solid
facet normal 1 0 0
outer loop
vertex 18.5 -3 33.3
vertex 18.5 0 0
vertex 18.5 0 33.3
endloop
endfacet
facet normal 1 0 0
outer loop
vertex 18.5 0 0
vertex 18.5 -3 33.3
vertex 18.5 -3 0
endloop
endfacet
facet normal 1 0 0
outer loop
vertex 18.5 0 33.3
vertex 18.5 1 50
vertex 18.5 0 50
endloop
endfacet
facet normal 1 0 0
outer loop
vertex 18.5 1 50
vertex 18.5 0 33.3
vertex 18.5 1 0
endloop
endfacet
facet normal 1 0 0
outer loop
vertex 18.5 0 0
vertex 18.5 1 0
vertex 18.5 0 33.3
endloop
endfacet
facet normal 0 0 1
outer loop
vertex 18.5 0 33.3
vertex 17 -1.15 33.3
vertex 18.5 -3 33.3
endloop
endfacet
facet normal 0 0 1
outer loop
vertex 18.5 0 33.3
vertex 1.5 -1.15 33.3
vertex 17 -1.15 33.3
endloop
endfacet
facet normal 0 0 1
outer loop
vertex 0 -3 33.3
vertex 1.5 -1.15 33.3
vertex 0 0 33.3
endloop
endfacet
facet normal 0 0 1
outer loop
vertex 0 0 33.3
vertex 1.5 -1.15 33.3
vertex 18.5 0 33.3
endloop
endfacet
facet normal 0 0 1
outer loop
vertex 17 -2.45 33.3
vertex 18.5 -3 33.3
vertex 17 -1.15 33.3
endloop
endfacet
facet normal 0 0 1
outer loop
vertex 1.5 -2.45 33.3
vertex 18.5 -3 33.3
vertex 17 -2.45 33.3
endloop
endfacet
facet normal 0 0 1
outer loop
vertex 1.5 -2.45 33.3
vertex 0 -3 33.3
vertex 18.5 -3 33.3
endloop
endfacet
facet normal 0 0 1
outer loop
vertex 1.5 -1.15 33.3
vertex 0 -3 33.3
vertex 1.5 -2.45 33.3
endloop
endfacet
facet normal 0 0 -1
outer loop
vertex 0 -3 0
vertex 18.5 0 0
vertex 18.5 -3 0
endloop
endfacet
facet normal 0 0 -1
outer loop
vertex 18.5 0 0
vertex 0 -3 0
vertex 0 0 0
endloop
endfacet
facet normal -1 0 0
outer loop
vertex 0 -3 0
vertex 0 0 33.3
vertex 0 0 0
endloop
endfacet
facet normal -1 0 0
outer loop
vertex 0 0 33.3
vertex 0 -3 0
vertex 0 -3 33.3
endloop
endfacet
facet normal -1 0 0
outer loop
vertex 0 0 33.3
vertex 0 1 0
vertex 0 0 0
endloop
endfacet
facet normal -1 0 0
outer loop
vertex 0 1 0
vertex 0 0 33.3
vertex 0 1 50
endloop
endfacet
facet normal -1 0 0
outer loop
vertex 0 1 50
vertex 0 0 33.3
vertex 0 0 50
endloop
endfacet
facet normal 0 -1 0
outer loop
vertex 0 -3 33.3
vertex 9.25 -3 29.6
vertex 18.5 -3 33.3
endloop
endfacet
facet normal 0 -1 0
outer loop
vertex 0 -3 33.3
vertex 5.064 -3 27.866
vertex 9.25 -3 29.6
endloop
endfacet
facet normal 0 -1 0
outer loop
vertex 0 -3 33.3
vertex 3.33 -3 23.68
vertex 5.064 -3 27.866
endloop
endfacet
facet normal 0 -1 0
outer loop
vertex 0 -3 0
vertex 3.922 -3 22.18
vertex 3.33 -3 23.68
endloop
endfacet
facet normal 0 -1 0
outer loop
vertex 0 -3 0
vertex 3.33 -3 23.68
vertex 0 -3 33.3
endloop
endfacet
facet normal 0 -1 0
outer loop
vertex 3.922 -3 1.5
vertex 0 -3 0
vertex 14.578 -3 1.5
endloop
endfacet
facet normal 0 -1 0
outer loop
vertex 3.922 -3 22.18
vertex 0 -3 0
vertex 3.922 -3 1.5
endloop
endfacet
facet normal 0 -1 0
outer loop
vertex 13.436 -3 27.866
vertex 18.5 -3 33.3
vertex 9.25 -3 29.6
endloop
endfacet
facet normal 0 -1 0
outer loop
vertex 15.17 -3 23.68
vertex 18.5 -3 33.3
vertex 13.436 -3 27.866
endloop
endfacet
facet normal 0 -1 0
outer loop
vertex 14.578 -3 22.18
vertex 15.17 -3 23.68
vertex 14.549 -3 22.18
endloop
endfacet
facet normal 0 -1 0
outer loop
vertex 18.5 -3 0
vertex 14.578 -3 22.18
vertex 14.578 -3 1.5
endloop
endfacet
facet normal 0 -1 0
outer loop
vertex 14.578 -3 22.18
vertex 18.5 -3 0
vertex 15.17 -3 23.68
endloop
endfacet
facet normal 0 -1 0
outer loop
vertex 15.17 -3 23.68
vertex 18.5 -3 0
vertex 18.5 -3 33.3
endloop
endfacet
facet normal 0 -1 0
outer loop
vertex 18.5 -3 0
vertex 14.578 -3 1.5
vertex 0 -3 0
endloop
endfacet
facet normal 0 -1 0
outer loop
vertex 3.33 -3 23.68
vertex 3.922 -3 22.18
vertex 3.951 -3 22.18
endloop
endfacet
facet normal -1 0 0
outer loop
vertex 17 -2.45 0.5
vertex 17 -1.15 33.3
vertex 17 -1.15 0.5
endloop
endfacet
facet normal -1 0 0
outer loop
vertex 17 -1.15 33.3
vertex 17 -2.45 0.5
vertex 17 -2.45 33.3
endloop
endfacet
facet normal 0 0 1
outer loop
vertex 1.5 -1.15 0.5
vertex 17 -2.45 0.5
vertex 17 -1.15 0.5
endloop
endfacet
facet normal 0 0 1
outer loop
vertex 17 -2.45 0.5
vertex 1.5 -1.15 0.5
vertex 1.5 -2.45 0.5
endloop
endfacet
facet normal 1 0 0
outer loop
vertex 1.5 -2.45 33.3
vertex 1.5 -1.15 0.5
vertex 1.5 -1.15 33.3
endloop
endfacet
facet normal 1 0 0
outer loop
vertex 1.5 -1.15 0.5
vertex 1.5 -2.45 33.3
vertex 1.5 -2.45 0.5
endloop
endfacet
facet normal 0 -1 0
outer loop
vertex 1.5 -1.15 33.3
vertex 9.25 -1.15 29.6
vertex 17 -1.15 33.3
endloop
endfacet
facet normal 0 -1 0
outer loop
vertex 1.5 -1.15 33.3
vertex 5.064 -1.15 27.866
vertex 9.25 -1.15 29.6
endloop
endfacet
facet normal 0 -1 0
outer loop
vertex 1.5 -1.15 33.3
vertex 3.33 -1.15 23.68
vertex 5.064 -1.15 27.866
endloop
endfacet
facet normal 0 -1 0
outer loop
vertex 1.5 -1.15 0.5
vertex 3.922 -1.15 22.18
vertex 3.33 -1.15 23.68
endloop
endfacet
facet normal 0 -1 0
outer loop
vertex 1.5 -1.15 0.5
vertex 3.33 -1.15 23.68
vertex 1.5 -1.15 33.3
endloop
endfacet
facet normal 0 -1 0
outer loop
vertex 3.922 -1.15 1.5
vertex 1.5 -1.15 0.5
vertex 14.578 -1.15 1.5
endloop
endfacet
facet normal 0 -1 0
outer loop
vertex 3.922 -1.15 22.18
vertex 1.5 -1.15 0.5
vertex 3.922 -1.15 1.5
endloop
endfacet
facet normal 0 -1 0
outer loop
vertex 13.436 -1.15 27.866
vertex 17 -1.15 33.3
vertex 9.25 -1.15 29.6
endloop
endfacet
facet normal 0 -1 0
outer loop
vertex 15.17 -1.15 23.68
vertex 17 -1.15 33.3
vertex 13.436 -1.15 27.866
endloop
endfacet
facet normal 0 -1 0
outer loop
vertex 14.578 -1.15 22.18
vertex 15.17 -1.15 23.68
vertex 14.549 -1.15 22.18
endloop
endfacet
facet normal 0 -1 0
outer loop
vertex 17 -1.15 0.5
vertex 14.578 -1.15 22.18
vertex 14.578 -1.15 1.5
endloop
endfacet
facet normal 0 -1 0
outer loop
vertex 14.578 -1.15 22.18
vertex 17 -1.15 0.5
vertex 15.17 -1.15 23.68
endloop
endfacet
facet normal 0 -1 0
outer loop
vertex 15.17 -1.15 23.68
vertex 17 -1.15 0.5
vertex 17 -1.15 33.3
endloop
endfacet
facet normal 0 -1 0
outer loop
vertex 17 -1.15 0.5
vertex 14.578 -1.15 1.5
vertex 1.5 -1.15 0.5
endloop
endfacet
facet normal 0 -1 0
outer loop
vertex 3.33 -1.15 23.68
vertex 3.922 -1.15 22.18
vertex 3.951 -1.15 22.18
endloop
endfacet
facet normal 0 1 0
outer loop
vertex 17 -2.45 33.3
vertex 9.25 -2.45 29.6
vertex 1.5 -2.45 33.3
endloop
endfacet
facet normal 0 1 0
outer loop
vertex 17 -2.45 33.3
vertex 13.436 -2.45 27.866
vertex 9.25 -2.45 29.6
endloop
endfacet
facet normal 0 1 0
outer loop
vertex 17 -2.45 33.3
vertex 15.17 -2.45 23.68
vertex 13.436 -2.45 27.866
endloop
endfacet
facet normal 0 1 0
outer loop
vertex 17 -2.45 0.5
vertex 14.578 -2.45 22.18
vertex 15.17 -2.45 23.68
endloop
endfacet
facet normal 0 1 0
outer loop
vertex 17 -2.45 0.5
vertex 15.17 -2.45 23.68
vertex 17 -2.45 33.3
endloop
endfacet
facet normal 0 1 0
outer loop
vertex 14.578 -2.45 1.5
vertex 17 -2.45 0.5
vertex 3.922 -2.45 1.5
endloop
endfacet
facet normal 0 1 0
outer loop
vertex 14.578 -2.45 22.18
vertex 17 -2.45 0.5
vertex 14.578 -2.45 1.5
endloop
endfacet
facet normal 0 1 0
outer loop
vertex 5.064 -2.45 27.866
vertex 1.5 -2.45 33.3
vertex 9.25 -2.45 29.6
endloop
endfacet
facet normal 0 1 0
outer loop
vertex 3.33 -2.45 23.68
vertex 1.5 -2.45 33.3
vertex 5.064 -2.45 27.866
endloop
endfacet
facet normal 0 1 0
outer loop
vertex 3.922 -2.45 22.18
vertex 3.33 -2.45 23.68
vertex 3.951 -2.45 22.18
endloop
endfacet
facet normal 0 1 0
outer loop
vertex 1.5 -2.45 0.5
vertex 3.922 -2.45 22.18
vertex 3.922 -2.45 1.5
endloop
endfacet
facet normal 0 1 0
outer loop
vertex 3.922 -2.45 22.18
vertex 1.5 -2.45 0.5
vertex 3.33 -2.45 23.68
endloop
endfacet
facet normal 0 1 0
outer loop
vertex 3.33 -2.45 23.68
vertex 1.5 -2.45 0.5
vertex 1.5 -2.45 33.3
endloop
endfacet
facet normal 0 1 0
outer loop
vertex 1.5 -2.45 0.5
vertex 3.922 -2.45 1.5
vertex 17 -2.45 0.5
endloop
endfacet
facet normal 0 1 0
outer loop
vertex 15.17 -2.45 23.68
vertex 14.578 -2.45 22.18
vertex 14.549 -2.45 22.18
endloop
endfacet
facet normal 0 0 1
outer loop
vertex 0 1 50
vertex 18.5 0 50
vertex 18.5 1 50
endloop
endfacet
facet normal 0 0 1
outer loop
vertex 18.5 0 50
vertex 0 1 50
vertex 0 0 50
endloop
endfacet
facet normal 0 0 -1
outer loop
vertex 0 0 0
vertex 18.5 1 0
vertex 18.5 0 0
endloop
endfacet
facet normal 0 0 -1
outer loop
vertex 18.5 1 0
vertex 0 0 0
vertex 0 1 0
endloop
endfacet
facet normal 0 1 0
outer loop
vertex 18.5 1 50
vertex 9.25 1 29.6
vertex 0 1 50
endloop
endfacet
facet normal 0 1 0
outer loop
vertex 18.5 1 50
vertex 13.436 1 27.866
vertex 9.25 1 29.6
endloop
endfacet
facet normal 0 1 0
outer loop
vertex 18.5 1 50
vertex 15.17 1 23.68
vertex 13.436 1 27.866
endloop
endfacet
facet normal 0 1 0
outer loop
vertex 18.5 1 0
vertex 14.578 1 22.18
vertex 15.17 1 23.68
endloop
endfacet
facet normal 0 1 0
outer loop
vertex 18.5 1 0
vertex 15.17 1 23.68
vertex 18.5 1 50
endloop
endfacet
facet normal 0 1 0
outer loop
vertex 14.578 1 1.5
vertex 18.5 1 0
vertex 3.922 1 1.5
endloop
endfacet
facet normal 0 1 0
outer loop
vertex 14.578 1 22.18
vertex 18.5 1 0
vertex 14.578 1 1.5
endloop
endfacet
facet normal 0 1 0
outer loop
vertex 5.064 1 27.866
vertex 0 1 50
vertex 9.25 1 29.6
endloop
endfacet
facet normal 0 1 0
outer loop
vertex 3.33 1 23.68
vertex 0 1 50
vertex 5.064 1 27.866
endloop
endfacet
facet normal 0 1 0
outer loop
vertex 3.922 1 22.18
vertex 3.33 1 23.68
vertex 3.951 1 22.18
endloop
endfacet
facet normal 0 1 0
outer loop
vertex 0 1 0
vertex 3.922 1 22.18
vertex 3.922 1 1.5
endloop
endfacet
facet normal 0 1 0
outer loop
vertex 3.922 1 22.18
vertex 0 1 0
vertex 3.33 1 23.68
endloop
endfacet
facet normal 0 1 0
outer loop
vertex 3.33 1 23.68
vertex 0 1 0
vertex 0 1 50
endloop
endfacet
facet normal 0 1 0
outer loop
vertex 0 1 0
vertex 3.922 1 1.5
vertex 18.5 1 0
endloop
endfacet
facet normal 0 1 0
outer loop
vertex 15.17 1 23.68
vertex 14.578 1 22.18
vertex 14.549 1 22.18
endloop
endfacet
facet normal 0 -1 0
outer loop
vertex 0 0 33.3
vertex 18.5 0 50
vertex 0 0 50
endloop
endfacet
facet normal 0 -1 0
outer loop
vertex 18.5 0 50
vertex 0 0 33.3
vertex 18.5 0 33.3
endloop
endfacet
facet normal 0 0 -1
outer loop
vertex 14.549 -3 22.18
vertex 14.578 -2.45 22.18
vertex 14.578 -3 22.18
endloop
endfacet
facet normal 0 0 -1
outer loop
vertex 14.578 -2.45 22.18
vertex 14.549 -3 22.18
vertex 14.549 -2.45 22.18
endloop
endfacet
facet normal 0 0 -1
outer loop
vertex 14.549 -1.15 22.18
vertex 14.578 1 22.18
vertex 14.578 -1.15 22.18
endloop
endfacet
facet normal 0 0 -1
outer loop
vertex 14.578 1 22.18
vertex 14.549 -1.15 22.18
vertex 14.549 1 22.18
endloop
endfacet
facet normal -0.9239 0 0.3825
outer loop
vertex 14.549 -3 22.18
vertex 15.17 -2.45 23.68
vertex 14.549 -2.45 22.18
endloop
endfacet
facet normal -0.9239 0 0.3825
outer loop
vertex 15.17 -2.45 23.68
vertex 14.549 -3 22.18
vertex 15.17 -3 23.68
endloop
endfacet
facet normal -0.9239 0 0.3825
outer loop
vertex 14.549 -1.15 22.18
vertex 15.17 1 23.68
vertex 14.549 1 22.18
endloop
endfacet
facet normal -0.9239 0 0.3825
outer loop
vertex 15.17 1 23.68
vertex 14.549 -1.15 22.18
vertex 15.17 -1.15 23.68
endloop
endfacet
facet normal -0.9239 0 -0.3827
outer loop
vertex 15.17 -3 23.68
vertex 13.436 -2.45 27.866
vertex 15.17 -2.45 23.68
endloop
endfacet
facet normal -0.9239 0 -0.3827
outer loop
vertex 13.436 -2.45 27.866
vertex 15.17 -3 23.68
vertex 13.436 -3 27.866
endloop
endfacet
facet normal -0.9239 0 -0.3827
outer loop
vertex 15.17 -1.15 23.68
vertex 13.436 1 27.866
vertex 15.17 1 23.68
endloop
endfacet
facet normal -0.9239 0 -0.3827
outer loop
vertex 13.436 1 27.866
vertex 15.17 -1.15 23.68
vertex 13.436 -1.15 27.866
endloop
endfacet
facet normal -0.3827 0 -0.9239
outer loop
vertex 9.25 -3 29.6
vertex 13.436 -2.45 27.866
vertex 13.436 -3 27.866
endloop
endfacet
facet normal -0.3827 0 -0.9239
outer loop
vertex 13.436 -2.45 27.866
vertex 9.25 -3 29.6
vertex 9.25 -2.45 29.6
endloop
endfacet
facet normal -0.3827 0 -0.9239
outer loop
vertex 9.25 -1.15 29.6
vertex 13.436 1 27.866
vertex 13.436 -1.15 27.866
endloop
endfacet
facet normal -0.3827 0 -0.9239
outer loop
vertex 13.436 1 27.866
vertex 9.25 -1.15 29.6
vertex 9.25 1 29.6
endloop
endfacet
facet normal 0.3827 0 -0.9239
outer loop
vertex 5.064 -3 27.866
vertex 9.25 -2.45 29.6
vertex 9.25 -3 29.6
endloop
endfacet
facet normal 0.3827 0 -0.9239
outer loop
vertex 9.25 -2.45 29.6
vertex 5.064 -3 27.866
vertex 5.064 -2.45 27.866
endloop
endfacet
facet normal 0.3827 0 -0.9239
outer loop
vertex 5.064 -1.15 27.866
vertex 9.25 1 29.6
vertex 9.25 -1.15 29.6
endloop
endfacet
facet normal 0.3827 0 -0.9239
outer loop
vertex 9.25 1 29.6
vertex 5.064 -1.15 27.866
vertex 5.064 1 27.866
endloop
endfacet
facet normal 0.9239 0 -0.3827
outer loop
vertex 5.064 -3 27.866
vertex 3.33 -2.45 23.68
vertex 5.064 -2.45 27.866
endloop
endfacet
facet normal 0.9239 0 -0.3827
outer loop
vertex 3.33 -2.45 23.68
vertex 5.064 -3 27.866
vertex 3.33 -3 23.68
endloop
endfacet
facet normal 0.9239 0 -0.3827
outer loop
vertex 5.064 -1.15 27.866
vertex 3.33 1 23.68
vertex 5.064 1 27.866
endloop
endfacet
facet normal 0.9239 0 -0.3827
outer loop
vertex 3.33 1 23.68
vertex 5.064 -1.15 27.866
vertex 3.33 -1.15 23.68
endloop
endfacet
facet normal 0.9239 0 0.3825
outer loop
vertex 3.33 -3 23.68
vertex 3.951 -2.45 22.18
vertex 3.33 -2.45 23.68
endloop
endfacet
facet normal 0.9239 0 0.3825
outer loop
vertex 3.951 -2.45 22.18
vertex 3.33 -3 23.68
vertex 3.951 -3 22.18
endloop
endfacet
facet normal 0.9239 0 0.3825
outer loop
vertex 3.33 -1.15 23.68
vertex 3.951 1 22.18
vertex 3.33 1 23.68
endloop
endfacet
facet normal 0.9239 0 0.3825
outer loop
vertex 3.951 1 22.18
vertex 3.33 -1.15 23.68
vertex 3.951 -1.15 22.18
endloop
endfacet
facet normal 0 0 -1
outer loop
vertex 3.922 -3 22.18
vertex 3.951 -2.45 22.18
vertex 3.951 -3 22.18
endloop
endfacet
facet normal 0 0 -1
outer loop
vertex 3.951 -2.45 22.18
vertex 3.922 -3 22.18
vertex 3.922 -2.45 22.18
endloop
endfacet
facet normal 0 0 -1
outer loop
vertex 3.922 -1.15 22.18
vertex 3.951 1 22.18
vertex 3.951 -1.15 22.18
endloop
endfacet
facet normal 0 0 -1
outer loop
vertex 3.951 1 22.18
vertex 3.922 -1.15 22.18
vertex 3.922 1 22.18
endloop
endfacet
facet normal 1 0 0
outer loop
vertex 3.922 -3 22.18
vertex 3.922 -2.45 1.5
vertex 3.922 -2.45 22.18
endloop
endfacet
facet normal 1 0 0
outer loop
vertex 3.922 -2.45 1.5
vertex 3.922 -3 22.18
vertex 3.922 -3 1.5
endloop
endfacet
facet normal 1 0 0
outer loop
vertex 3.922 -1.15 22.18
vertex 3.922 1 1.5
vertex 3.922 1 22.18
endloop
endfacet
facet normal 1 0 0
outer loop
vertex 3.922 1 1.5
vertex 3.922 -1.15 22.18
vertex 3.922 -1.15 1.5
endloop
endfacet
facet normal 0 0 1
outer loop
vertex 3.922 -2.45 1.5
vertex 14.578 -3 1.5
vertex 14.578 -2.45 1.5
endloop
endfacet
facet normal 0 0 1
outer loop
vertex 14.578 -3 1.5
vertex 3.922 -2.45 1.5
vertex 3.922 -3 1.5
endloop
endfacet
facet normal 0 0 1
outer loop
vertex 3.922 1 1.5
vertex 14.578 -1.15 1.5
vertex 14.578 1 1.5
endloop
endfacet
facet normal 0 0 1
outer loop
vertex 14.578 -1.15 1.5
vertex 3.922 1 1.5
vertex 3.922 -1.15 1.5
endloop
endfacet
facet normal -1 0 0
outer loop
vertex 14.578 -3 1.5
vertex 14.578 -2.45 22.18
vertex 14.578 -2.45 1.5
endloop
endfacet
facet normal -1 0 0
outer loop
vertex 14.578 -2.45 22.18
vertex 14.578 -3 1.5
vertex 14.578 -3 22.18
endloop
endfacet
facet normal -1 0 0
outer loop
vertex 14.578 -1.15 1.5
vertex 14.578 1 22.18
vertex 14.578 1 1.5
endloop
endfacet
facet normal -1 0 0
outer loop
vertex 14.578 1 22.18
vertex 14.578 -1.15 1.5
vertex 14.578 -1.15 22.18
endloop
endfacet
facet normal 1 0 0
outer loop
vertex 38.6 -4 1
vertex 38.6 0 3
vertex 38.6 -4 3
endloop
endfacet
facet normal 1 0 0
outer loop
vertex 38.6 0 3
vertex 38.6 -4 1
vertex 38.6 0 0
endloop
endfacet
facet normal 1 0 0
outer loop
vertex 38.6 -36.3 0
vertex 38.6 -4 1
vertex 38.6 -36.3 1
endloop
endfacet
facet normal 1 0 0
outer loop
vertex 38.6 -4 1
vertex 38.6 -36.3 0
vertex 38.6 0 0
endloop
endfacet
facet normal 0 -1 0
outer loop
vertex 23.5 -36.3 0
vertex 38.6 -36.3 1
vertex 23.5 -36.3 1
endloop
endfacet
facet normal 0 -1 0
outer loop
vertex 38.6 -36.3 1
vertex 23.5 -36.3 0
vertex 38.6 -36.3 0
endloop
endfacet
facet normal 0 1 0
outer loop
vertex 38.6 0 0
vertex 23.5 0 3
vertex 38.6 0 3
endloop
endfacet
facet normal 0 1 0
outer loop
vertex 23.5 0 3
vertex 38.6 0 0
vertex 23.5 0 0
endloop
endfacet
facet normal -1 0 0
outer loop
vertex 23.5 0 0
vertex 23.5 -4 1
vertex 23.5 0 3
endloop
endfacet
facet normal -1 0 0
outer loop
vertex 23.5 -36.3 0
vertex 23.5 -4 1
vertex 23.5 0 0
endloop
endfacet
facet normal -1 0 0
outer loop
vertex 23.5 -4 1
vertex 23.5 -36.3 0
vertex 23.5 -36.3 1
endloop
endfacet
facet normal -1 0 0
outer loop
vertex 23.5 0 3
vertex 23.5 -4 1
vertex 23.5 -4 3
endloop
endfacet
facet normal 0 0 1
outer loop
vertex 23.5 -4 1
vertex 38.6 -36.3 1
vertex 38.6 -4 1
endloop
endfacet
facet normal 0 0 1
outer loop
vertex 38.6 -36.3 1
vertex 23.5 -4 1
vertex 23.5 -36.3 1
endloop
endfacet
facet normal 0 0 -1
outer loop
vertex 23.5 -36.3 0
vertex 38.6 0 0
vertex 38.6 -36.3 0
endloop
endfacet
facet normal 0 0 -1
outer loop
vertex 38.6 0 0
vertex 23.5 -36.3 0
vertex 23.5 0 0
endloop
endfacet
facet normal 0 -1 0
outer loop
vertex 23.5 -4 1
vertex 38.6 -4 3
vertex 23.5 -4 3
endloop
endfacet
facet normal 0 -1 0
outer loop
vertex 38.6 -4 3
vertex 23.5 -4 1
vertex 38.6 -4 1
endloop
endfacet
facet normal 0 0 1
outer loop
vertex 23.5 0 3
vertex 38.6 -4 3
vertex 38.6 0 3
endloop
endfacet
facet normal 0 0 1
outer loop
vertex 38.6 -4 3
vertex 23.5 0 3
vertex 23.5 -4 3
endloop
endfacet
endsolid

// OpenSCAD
// file: neuturm.scad
use <MCAD/regular_shapes.scad>

// Setup
// höhe, seite, array durchgänge, array tore
hoehe = 50;
radius = 18.5;
seite = 18.5;
tore = [4];
durchgaenge = [];

// Berechnete größen

sideRad = seite * sqrt(3)/2;


module move(x=0,y=0,z=0,rx=0,ry=0,rz=0)
{ translate([x,y,z])rotate([rx,ry,rz]) children(); }

module wallmove(x=0, y=0, z=0, seite=0) {
  rotate([0,0,seite*60]) translate([x,y,z]) children();
}

function flatten(l) = [ for (a = l) for (b = a) b ] ;


/* move(30,sideRad+10,1, 0, 0, 0) zinnenkranz();
turm(); */

module turm() {
  difference() {
    // turmkörper
    union() {
      hexagon_tube(hoehe, radius, 1);
      hexagon_prism(2,radius);
      for (i = tore) {
        wallmove(0, sideRad-.1, 0, i)
        tor();
      }
        mauerstruktur();
    }
    for (i = flatten([durchgaenge, tore])) {
      wallmove(0, sideRad-2, 1, i)
       toroeffnung();
    }
    for (i = [1:6]) {
      wallmove(0, sideRad-2, 10, i)
       fenster();
    }
    move(0,0,1) cylinder_tube(5, sideRad-2, radius);
  }
}

module zinnenkranz() {
move(0, 0, -1)
  difference() {
    union() {
    difference() {
      translate([0,0,0]) hexagon_tube(7,radius +3.5,2);
        zinnen();
    }
    move(0,0,3) hexagon_prism(1, radius +1.5);
    move(0,0,0) hexagon_prism(3, radius -1.2);
    }
    for(i = durchgaenge) {
    rotate([0,0,i*60]) translate([0, sideRad+2.2, 4]) cube([radius*2,4,radius +1.5], center = true);
    }
  }
}

module tor() {
  torbreit = seite;
  torhoch = torbreit*1.8;
  color("Green") {
    move(0,0, torhoch/2) cube([torbreit, 1.2, torhoch], center = true);
    move(0,1, torhoch/2) difference() {
      cube([torbreit, 1.5, torhoch], center=true);
      move(0,0,2) cube([torbreit-3, 1, torhoch + 3], center=true);
    }
  }
}

module toroeffnung() {
  $fn = 8;
  torbreit = seite - seite/5;
  torhoch = hoehe/3 - (hoehe/30);
  rundungdm = torbreit/2 -torbreit/10;
  //
  translate([0,5,rundungdm*4]) {
    union() {
      rotate([90,0,0]) {
        linear_extrude(6) {
          circle(rundungdm);
          move(0, -rundungdm*2) square([rundungdm*1.8, (rundungdm*4)-3], center=true);
        }
      }
    }
  }
}

module fenster() {
  $fn = 8;
  fensterbreit = seite/5;
  fensterhoch = hoehe;
  fensterdm = fensterbreit/2 -fensterbreit/10;
  //
  translate([0,5,fensterdm*14]) {
    union() {
      rotate([90,0,0]) {
        linear_extrude(6) {
          circle(fensterdm);
          move(0, -fensterdm*4) square([fensterdm*1.8, (fensterdm*10)-3], center=true);
        }
      }
    }
  }

}

module mauerstruktur() {
  for (i = [1:6]) {
    move(rz=i*60)
    move(x=-sideRad/2-.5,y=-sideRad+0.1, rx=90) {
        scale([radius / 72, (hoehe-2) / 108, 0.9/ 256])
        surface(file = "mauer2.png", convexity = 3);
    }
  }
}


module solomauer() {
  cube([seite, 1, hoehe]);
  move(x=0,y=0, rx=90) {
    scale([radius / 72, (hoehe-2) / 108, 0.9/ 256])
    surface(file = "mauer2.png", convexity = 3);
  }
}


module zinnen() {
  zinB = seite/6;
  zinVers = seite/6 * 1.8;
  echo(zinB);
  for (i = [1:6]) {
    rotate([0,0,i*60]) {
      color("Blue") {
        translate([0, sideRad, 7]) {
          translate([-zinVers,0,0]) cube([zinB,7,5], center= true);
          translate([0,0,0]) cube([zinB,7,5], center= true);
          translate([zinVers,0,0]) cube([zinB,7,5], center= true);
        }
      }
    }
  }
}
// main file
use <neuturm.scad>
hoehe = 50;
radius = 18.5;
seite = 18.5;
tore = [4];
durchgaenge = [];

difference() {
union() {
solomauer();
move(x=18.5/2, y=-1.9) schiebetor();
}
move(x=18.5/2, y=-3) toroeffnung();
}

move(x=seite+5, rx=90) einschub();

module schiebetor() {
  torbreit = seite;
  torhoch = torbreit*1.8;
  color("Green") {
    move(0,0.5, torhoch/2) difference() {
      cube([torbreit, 3.2, torhoch], center=true);
      move(0,-0.4,2) cube([torbreit-3, 1.3, torhoch + 3], center=true);
    }
  }
}


module einschub() {
  torbreit = seite;
  torhoch = torbreit*1.8;
  cube([torbreit-3.4, 1, torhoch + 3]);
  cube([torbreit-3.4,3,4]);
}
